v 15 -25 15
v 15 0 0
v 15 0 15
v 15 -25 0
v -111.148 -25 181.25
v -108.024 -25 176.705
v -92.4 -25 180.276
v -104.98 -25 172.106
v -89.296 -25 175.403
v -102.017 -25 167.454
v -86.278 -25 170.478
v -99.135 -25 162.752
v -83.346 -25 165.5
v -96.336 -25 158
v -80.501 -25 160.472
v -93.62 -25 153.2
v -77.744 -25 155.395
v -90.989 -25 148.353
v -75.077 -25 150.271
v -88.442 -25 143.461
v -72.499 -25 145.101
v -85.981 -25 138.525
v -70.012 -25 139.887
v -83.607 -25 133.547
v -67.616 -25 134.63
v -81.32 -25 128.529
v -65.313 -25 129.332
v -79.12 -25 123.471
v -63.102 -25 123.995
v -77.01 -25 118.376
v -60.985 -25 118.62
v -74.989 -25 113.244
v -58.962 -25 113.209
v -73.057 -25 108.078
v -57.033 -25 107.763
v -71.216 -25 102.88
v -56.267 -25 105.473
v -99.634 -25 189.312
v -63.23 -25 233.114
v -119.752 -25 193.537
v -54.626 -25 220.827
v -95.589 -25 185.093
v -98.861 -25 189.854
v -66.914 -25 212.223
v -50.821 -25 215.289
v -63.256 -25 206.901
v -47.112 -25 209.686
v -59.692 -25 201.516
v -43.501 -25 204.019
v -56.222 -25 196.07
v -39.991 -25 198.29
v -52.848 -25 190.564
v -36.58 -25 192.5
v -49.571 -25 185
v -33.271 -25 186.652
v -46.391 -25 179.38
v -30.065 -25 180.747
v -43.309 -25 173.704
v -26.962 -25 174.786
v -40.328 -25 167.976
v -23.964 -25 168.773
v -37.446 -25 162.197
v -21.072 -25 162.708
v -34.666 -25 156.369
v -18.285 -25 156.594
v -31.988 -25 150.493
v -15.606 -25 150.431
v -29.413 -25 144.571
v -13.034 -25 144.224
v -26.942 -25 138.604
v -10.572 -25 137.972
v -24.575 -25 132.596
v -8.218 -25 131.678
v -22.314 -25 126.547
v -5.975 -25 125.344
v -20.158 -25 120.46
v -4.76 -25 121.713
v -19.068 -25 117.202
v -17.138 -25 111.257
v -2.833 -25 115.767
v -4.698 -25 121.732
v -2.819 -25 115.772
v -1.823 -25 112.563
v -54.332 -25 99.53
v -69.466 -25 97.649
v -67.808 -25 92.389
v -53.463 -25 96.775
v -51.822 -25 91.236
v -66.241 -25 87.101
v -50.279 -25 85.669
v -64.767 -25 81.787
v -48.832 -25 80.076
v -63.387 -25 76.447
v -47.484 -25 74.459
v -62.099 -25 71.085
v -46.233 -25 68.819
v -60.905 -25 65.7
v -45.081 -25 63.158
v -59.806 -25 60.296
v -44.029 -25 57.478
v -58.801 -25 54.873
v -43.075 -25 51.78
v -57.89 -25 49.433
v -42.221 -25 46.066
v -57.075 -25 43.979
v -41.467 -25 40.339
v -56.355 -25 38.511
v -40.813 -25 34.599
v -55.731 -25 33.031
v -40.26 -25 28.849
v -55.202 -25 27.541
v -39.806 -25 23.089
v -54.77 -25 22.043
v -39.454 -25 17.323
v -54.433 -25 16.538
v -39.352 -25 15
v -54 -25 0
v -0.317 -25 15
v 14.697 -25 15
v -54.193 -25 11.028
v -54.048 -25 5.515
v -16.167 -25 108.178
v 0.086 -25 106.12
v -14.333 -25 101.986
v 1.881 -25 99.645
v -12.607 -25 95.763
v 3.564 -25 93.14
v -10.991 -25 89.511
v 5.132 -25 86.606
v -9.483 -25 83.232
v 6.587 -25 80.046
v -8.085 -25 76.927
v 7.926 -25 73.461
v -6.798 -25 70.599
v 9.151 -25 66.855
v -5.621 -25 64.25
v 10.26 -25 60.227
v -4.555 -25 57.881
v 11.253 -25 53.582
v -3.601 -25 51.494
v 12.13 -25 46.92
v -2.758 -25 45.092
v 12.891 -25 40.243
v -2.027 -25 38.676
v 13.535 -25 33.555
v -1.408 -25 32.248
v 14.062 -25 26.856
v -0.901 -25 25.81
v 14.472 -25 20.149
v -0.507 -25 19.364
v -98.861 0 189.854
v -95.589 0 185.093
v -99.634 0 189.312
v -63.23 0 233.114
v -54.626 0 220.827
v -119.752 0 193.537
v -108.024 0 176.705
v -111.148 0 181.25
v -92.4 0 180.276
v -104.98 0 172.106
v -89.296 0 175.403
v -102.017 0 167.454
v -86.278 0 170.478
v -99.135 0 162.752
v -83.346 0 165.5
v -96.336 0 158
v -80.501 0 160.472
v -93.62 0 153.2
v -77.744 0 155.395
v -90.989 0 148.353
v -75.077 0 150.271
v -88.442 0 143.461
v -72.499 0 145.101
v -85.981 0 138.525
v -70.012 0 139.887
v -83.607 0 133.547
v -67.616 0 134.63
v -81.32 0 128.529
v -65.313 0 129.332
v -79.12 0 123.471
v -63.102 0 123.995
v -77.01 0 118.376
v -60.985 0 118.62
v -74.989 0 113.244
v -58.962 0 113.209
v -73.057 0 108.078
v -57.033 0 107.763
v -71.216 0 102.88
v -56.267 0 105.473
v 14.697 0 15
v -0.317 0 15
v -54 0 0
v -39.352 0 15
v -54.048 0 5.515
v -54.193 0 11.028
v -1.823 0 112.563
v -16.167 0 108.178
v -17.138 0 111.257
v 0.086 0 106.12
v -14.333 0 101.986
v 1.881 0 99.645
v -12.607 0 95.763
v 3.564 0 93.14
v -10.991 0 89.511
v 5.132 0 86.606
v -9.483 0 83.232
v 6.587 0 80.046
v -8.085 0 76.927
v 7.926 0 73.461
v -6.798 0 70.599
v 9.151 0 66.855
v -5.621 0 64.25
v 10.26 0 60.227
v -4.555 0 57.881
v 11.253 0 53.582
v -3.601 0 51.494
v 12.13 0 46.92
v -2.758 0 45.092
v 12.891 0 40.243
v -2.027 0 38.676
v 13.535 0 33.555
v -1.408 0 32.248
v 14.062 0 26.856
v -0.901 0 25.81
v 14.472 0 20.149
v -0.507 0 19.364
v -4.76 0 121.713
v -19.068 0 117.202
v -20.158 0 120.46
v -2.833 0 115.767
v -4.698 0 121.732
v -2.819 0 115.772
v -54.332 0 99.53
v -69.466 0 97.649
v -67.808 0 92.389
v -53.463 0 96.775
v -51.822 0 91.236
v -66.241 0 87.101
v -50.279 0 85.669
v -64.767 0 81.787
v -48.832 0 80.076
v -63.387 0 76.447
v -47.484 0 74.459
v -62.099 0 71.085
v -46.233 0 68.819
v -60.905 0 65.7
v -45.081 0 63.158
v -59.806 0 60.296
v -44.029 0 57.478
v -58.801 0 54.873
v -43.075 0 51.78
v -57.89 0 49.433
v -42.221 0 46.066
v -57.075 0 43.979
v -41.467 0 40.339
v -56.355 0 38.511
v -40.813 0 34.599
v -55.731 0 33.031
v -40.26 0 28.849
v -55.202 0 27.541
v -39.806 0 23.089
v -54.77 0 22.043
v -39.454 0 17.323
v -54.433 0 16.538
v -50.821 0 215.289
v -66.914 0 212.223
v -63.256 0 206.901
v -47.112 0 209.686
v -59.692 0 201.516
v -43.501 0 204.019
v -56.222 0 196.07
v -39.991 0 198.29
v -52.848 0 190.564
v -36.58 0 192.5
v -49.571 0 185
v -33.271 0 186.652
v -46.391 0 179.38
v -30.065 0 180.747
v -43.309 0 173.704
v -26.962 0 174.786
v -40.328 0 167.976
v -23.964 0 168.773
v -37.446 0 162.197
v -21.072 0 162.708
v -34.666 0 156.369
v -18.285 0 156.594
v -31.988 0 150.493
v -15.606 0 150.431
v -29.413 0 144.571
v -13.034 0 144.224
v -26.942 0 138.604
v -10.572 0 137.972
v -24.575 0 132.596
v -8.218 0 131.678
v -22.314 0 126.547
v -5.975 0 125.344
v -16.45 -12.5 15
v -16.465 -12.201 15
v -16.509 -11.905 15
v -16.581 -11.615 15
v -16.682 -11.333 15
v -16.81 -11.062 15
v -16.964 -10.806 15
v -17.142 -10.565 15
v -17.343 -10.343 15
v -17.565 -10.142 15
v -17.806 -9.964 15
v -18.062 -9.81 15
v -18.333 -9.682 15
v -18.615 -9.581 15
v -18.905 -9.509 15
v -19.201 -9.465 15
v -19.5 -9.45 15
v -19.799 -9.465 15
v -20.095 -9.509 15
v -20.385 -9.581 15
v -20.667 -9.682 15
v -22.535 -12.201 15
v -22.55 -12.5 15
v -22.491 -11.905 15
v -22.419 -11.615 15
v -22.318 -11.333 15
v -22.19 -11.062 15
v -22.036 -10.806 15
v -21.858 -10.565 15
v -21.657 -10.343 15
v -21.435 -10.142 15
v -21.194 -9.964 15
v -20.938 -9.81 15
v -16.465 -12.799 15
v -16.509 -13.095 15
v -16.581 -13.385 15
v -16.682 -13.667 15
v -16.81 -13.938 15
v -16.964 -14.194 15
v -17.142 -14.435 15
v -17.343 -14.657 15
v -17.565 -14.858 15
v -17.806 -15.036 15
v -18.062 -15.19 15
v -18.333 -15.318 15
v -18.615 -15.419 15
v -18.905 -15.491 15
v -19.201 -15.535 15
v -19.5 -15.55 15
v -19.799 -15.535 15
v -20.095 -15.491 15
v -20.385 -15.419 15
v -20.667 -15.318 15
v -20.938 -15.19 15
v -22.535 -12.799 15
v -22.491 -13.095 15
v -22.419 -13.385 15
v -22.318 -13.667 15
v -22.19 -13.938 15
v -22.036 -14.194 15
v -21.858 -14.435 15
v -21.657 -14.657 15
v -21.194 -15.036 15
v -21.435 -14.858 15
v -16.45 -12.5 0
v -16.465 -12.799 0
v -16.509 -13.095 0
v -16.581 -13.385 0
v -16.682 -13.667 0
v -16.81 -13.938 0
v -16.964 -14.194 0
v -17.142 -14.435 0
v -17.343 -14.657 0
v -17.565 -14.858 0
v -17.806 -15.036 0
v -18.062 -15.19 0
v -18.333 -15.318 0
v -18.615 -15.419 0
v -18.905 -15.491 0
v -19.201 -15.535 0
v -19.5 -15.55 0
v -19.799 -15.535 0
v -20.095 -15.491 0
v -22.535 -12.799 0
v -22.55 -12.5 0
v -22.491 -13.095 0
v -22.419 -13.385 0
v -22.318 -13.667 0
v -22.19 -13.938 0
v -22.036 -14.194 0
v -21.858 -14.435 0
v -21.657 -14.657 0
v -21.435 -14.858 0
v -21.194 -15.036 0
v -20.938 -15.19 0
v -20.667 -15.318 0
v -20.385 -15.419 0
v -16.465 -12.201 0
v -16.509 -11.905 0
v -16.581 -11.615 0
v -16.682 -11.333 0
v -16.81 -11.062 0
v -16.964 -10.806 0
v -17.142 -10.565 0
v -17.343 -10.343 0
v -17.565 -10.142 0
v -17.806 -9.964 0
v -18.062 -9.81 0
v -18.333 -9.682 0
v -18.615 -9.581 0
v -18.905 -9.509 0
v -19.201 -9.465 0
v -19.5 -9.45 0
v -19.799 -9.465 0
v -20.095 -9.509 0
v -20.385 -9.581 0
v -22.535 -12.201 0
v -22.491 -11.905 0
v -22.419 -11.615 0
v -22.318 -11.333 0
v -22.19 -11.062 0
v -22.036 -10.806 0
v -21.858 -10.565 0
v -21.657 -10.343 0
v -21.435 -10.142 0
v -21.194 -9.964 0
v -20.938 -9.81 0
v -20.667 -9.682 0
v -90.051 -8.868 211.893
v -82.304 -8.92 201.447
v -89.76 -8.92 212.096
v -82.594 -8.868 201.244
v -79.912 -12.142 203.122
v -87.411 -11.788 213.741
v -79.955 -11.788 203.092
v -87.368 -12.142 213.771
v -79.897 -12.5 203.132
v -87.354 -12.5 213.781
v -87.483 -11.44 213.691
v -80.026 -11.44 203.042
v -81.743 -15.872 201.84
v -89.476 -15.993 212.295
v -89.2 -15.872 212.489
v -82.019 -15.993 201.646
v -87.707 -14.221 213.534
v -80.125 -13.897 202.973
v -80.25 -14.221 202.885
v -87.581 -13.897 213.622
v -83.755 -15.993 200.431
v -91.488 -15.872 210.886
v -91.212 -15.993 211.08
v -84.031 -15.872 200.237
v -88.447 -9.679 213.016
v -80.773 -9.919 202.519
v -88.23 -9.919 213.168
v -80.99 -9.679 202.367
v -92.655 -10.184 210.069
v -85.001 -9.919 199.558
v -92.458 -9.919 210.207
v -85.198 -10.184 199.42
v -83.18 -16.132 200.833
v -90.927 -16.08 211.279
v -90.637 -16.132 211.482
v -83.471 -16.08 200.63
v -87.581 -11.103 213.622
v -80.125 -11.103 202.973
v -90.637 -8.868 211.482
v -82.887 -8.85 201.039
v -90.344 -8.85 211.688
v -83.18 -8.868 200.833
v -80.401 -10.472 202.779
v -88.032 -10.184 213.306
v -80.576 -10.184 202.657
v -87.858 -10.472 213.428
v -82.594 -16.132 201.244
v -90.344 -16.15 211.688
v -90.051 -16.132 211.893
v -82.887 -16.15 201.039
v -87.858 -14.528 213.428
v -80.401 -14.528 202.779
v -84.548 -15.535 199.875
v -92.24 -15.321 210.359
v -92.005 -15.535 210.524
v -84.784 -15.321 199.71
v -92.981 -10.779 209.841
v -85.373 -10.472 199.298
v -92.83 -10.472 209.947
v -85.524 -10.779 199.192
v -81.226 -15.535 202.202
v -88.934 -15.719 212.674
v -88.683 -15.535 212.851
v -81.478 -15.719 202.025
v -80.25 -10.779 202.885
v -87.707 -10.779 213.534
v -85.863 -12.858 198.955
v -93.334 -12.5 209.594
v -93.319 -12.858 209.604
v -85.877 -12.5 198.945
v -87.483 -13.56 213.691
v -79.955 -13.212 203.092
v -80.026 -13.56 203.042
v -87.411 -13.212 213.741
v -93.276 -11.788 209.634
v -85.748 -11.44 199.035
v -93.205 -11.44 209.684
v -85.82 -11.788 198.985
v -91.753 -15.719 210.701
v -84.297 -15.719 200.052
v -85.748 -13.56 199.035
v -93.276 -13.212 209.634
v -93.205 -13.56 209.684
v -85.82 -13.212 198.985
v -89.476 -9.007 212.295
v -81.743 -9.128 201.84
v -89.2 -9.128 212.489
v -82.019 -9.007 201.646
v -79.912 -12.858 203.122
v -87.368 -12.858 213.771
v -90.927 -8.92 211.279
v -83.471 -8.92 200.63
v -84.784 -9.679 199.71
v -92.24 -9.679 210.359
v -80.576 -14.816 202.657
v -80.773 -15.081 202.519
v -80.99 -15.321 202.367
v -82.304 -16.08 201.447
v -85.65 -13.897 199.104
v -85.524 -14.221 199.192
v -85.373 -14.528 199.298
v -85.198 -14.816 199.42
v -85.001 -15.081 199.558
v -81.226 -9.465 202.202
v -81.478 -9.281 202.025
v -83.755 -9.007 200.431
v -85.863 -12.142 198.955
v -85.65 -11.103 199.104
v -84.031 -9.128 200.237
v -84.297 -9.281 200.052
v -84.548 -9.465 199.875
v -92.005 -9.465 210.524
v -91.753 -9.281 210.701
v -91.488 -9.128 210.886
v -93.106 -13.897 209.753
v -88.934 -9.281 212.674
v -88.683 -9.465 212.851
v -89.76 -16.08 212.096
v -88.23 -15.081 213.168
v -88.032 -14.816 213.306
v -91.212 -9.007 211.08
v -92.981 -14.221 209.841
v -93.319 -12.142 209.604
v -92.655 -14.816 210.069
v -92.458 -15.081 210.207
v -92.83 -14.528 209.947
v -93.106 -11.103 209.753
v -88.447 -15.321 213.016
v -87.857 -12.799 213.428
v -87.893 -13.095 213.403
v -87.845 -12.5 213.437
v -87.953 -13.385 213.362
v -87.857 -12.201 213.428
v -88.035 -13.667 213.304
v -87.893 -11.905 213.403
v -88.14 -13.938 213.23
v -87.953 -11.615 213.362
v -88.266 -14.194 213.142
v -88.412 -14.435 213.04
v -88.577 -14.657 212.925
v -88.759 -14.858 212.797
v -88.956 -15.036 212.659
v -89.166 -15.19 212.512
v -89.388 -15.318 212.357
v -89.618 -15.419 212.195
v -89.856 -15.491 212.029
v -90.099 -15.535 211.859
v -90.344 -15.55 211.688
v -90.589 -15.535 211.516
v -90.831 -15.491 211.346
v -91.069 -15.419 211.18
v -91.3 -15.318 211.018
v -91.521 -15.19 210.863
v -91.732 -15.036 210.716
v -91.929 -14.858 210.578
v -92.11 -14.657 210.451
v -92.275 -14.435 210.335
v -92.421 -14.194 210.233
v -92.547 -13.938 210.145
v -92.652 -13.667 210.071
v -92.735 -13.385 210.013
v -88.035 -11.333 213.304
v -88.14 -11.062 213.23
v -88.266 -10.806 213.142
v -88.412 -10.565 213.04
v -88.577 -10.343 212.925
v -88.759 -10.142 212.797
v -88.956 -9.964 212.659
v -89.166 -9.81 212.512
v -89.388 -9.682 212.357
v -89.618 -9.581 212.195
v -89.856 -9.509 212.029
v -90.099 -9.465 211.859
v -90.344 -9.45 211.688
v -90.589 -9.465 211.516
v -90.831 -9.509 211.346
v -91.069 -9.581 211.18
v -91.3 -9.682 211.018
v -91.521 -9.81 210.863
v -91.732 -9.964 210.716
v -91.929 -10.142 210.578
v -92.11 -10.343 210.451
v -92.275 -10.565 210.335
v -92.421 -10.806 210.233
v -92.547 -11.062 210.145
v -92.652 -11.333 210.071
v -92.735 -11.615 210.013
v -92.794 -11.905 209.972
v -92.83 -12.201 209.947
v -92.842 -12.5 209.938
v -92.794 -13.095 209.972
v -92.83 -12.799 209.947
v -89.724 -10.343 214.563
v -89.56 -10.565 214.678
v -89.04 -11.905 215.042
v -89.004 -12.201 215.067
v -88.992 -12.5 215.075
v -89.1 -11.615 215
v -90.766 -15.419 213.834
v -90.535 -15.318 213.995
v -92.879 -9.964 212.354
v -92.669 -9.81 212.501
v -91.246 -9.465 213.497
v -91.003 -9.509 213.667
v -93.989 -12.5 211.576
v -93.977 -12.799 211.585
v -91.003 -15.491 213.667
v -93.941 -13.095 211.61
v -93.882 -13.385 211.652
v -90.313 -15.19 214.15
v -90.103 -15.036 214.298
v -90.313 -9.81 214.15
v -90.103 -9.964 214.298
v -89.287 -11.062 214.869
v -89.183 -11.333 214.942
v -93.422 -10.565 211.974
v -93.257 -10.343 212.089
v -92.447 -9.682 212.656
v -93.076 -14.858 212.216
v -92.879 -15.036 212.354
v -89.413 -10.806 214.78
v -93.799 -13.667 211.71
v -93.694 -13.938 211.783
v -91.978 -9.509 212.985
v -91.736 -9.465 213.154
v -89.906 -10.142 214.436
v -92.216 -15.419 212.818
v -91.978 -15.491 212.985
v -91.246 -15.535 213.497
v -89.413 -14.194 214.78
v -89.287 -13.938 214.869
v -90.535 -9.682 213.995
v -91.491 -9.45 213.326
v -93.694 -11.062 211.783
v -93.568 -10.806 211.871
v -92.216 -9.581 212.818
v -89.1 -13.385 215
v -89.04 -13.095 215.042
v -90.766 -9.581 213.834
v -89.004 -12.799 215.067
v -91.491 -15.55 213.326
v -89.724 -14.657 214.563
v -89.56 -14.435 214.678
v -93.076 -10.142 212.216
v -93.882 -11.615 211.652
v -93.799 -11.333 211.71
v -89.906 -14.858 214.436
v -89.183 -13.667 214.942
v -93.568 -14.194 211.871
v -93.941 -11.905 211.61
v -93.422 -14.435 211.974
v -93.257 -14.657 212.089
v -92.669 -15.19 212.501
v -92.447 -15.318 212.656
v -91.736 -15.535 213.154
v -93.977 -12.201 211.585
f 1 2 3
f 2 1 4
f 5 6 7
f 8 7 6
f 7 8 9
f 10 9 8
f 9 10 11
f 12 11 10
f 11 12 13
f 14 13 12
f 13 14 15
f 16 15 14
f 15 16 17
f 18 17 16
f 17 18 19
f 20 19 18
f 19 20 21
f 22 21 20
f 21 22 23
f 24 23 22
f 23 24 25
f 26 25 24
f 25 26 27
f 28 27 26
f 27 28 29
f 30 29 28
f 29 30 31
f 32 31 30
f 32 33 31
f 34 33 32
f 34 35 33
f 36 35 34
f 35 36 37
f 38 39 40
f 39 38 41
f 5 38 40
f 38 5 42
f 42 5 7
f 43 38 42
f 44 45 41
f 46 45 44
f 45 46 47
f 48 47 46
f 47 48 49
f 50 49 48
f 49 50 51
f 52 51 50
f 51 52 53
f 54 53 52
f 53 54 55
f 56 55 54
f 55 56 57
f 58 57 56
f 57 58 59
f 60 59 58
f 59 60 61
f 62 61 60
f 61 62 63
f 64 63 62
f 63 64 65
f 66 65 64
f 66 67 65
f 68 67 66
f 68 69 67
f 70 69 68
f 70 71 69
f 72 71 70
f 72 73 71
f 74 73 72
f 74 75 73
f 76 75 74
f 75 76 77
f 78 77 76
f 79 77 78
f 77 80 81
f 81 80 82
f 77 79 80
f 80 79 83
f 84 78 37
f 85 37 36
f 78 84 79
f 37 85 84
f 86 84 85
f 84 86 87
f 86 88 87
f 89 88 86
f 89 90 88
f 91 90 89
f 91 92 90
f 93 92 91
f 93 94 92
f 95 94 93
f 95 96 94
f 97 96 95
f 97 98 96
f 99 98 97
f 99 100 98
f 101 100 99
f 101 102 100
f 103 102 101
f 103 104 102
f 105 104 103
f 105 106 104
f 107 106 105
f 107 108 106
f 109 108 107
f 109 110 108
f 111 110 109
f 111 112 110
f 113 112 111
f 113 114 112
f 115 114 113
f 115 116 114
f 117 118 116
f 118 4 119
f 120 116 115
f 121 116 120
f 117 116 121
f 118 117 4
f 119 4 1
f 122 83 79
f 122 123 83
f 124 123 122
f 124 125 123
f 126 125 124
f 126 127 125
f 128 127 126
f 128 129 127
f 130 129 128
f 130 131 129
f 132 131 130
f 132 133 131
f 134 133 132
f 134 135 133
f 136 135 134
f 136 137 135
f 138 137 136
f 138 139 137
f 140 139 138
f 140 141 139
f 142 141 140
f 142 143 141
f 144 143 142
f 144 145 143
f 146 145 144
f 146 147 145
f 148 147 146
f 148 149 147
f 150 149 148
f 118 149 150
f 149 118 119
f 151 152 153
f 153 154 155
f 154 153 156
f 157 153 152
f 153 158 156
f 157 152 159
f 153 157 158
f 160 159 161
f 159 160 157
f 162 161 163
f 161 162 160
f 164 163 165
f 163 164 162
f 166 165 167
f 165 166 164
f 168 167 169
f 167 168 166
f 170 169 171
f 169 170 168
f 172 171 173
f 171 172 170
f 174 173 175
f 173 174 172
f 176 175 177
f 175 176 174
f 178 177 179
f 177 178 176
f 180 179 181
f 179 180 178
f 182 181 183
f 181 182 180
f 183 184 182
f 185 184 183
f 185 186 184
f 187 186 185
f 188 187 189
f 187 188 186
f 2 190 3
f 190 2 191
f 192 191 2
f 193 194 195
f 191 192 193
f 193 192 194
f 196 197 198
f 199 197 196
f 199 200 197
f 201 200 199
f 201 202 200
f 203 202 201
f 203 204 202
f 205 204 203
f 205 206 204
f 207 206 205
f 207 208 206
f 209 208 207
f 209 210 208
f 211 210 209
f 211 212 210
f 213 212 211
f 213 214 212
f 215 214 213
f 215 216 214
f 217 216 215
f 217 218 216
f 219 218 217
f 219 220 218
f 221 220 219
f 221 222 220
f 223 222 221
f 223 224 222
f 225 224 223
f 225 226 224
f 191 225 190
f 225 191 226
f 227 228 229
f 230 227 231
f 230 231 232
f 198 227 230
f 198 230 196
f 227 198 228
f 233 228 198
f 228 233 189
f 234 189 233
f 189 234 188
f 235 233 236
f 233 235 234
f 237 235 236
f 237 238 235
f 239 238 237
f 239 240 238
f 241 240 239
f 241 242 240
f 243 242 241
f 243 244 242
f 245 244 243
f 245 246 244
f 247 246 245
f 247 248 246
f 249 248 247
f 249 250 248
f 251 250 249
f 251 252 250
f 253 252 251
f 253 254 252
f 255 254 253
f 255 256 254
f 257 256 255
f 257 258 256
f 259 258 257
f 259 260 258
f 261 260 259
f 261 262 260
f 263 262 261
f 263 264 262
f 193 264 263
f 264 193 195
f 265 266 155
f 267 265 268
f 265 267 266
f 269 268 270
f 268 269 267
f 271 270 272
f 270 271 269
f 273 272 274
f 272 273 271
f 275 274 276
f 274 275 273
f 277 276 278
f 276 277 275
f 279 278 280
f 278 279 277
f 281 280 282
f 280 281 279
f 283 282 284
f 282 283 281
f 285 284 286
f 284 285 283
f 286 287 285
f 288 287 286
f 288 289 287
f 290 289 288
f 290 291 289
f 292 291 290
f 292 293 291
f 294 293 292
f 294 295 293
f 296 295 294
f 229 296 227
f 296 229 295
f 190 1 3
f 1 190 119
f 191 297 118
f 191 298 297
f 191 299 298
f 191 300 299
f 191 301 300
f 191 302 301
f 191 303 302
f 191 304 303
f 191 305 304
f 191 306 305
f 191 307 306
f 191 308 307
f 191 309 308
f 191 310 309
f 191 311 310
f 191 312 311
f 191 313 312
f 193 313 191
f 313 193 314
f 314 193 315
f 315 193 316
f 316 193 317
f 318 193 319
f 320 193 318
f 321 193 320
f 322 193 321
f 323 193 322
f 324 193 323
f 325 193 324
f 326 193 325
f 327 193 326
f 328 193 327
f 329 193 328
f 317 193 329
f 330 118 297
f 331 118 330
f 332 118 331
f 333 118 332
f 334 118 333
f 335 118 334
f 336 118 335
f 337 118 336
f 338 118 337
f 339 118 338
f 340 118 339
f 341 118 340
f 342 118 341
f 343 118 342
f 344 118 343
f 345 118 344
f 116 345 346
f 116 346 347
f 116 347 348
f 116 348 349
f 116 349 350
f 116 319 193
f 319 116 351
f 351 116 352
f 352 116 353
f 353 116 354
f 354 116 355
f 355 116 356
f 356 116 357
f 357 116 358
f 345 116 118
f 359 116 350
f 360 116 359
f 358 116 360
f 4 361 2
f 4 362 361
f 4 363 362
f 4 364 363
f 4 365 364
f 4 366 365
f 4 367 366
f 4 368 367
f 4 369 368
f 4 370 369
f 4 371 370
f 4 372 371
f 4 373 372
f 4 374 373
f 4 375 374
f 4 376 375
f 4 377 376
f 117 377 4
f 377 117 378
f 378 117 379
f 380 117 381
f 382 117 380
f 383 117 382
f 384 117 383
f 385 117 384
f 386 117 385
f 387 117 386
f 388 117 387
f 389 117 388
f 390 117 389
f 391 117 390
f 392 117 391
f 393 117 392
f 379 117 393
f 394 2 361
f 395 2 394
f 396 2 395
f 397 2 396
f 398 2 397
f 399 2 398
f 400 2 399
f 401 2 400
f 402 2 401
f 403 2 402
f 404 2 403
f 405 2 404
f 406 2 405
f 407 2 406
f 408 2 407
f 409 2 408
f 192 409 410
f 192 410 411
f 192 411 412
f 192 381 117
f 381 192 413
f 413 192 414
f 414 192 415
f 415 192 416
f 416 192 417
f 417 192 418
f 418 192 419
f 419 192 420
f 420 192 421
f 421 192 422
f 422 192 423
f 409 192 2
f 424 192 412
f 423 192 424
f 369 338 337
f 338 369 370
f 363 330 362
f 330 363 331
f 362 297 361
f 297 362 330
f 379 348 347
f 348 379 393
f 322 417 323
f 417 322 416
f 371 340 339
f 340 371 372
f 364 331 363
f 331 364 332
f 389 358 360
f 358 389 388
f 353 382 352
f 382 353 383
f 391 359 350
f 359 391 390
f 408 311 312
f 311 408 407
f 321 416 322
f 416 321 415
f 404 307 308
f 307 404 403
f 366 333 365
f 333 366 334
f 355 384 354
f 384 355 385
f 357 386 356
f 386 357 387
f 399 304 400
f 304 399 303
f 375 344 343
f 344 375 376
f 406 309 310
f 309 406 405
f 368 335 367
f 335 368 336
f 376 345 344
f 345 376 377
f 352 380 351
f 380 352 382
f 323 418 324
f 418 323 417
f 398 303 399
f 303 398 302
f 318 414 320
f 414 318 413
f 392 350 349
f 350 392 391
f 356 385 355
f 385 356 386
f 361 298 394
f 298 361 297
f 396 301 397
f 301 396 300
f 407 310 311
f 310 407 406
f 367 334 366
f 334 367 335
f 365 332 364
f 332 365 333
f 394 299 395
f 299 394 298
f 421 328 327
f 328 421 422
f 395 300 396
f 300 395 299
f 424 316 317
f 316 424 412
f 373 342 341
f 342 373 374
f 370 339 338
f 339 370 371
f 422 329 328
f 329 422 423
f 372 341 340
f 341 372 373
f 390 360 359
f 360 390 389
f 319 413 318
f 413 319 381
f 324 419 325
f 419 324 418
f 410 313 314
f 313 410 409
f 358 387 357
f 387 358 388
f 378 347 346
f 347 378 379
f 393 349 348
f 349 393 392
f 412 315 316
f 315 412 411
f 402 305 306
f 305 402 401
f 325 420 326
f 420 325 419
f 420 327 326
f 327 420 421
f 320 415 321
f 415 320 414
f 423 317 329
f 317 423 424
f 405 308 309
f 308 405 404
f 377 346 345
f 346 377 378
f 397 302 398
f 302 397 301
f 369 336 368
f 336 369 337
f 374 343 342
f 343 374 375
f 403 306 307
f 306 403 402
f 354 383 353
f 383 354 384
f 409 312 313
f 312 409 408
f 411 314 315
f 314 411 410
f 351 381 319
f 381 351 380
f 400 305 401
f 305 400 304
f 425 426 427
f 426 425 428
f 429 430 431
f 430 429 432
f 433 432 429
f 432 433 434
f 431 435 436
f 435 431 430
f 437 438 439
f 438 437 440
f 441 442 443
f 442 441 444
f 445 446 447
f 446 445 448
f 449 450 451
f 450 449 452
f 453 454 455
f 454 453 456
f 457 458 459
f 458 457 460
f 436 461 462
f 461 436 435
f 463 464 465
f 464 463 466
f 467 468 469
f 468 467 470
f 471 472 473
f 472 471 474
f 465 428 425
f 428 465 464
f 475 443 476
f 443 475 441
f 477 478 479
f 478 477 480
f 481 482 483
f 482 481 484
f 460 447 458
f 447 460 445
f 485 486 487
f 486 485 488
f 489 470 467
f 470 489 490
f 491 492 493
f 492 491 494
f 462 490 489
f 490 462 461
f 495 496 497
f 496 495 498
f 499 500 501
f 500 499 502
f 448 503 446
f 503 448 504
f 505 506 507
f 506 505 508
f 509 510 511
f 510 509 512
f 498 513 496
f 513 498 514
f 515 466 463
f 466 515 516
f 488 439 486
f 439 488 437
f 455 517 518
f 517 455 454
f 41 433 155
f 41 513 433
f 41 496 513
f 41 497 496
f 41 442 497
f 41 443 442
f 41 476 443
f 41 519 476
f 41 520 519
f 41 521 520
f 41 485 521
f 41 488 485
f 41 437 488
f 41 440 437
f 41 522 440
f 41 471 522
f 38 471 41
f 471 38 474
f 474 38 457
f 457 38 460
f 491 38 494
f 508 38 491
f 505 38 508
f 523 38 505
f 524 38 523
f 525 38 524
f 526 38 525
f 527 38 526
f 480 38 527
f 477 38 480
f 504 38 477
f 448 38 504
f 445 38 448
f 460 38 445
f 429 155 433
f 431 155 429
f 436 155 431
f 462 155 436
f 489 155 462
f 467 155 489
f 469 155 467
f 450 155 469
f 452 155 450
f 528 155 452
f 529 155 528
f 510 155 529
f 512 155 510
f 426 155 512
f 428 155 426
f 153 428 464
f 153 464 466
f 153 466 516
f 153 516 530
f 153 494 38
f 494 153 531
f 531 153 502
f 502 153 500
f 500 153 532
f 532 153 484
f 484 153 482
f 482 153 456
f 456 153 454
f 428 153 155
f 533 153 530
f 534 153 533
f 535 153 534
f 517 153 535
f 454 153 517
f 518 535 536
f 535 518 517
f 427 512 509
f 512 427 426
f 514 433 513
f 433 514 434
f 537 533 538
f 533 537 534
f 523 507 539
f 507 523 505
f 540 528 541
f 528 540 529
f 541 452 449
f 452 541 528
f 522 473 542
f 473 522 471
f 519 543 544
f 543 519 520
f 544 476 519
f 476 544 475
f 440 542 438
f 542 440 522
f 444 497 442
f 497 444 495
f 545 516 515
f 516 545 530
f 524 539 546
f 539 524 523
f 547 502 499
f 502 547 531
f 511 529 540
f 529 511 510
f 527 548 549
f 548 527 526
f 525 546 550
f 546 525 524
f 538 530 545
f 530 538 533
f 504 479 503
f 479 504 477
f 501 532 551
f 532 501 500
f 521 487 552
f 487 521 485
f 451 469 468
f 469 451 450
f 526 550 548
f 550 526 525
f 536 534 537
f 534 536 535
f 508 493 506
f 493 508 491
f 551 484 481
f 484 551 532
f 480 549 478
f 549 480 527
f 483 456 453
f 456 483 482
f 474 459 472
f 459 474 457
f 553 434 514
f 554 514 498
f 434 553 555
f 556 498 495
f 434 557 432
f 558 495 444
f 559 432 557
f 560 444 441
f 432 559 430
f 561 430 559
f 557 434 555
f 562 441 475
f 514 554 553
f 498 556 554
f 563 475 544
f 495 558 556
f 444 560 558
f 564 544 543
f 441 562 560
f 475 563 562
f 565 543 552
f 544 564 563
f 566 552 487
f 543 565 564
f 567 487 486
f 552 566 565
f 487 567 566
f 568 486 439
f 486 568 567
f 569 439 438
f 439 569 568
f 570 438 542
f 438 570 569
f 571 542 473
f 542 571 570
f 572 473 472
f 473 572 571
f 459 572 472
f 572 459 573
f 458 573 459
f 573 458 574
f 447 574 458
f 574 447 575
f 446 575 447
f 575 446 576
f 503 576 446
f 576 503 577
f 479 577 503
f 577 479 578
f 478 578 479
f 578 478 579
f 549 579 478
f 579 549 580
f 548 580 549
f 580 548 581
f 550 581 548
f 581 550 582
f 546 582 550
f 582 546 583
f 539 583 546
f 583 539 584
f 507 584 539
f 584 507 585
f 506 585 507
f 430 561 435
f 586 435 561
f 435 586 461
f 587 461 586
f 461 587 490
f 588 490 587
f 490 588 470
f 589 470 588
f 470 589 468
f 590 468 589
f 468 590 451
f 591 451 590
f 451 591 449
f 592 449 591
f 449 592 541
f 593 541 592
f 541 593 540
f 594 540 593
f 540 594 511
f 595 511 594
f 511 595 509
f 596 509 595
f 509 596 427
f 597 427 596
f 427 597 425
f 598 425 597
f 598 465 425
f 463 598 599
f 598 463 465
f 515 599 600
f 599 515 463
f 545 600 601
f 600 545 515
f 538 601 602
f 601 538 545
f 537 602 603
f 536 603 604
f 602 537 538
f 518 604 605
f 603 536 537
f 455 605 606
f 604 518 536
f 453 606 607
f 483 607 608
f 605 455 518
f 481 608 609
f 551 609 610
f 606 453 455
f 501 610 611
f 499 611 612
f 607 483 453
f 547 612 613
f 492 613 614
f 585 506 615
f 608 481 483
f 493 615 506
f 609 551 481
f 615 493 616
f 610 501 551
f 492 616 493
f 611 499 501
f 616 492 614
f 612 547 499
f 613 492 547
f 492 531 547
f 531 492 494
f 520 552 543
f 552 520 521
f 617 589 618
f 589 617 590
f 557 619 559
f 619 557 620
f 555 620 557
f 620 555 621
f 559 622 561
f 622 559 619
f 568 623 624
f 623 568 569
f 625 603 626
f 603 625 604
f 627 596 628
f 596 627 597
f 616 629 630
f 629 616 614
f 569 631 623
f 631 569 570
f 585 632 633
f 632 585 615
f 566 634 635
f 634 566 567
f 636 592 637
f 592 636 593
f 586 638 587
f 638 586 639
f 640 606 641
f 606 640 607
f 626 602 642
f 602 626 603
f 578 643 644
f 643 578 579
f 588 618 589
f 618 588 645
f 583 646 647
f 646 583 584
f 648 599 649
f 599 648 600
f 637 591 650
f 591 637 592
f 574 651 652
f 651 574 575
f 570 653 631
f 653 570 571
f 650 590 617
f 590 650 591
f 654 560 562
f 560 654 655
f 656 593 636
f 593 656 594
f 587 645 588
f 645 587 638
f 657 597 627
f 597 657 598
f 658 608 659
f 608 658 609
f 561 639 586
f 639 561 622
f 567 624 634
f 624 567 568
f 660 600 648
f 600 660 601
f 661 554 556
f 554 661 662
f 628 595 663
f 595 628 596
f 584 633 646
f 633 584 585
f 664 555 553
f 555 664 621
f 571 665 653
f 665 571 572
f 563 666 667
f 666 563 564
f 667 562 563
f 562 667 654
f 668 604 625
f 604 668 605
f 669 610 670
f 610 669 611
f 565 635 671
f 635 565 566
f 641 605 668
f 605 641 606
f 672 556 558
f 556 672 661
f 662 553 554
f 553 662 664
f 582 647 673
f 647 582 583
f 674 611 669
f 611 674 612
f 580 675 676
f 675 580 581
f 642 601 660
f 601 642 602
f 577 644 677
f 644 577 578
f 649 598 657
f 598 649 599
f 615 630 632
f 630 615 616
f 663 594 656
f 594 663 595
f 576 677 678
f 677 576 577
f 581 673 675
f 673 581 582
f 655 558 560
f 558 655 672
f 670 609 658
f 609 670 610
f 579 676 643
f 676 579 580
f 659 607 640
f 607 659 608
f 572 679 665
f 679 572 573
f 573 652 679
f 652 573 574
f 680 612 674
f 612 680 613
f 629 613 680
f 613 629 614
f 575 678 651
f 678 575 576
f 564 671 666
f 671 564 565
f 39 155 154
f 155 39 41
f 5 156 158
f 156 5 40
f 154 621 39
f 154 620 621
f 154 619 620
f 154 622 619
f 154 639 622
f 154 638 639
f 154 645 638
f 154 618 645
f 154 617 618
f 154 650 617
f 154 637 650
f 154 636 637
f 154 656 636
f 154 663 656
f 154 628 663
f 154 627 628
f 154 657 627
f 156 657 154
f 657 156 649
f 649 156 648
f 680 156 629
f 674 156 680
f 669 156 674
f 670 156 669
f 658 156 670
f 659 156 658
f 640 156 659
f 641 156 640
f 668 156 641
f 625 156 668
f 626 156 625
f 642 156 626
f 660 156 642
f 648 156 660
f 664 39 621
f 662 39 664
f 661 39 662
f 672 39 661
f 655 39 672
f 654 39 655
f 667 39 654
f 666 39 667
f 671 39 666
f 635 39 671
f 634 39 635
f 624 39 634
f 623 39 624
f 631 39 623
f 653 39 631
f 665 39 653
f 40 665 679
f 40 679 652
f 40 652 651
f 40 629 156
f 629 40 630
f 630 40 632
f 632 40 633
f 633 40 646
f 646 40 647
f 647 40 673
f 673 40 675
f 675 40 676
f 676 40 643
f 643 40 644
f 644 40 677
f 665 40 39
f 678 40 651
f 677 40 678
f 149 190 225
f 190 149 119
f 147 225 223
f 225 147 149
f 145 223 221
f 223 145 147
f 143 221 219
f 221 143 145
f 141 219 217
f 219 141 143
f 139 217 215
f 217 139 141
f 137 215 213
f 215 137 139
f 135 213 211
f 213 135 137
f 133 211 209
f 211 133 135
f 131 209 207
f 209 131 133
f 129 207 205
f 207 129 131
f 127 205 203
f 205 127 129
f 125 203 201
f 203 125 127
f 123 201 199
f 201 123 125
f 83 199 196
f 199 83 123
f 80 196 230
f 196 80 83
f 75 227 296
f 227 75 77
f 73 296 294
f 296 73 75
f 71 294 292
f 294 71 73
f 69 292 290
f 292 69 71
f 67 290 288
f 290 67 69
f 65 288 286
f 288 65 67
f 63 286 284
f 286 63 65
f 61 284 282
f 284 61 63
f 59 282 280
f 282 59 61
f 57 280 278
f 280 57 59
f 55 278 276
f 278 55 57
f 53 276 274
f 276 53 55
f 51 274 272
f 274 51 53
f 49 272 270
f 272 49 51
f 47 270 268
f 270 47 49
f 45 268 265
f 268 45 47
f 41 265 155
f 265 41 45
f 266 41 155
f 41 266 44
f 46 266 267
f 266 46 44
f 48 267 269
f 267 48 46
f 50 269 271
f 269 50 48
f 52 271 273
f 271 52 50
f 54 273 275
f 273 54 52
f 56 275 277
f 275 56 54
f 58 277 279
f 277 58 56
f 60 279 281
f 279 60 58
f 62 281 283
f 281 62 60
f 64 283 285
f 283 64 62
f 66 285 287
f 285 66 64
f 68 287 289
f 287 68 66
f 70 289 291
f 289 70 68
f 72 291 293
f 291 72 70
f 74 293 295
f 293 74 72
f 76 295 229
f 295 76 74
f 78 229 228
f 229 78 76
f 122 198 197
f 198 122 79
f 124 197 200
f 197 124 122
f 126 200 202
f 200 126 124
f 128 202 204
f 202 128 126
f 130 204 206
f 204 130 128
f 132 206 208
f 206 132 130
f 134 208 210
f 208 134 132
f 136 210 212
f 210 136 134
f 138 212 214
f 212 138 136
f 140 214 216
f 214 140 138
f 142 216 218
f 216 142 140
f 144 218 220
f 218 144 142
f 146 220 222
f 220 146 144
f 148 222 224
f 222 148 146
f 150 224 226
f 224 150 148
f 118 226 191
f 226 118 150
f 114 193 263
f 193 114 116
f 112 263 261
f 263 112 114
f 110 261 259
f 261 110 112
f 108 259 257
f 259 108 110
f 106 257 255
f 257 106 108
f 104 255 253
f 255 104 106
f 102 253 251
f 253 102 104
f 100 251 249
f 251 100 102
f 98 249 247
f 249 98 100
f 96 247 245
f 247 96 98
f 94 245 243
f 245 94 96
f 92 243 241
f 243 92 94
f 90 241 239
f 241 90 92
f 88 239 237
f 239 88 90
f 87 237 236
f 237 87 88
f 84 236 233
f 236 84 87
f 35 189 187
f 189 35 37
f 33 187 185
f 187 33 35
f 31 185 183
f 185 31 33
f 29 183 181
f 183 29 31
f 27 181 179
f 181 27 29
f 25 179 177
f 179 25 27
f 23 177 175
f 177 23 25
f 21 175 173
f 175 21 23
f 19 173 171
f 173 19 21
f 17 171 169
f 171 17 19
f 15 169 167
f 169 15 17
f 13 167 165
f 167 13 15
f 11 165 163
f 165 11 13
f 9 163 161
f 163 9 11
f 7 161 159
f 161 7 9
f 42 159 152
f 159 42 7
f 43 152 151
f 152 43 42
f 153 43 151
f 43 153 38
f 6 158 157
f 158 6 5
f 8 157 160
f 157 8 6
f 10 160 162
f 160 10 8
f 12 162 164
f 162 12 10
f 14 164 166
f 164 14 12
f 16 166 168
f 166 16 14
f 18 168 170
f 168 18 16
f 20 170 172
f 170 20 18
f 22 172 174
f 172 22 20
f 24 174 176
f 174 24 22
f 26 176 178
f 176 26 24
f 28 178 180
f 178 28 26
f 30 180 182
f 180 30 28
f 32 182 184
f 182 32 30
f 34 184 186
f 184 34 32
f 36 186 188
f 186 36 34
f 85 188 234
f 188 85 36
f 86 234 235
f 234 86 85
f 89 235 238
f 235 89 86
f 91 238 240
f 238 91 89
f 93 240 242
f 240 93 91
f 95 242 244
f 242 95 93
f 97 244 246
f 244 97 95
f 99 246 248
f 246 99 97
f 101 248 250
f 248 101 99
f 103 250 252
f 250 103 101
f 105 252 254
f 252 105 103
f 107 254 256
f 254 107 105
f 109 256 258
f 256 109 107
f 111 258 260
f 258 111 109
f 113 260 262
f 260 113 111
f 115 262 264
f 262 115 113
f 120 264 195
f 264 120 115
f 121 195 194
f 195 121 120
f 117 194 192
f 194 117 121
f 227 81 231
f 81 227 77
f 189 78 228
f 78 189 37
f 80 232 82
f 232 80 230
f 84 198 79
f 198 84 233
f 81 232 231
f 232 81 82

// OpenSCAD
// file: base.scad
// pc-licht-stativ-halter

// 25, 18.25
// check: 18.25 + 6.6 == 24.85

$fn=64;

w=76;
h=3;

h_ribs=2.7;

d_total = 60;
d_ribs = 44.5;

tolerance_ribs = 0.1;
r_ribs = 6.6/2 - tolerance_ribs;

module base(){
    cube([76, 60, h]);
    
    for(x=[12.5:24.85:w]){  // 12.5 zum äußeren Rand gemessen
        hull(){
            translate([x+r_ribs, (d_total-d_ribs)/2 + r_ribs, -h_ribs])
            cylinder(r=r_ribs, h=h_ribs);
            
            translate([x+r_ribs, (d_total-d_ribs)/2 + d_ribs - r_ribs, -h_ribs])
            cylinder(r=r_ribs, h=h_ribs);
        }
    }
}

//base();
// main file
// licht halterung

// idee: gut basis, je 3 arme 25cm lang mit 10° neigung

include <base.scad>;

angles = [0, 35];
width = 15;
height=25;
dist = 39;
height_end=15;

radius = 370;
radius2 = radius-dist-width;

fn = 5;

module sector(radius, angles, fn = 24) {
    r = radius / cos(180 / fn);
    step = -360.0 / fn;

    points = concat([[0, 0]],
        [for(a = [angles[0] : step : angles[1] - 360]) 
            [r * cos(a), r * sin(a)]
        ],
        [[r * cos(angles[1]), r * sin(angles[1])]]
    );

    difference() {
        circle(radius, $fn = fn);
        polygon(points);
    }
}

module arc(radius, angles, width = 1, fn = 360) {
    difference() {
        sector(radius + width, angles, fn);
        sector(radius, angles, fn);
    }
} 

if(false){  // print plate dimensions
    %translate([-250, 0, 0])
    cube([250, 250, 1]);
}

module einschmelzhuelse(){
    rotate([90,0,0]){
        cylinder(r=7.3/2, h=13); // hülse
        cylinder(r=6.1/2, h=40); // schraube
    }
}

module arm(base_end=true){
    // arm
    difference(){
        union(){
            translate([-radius, 0, 0])
            linear_extrude(height) arc(radius, angles, width);

            translate([-radius2-width-dist, 0, 0])
            linear_extrude(height) arc(radius2, angles, width);
            
            if(base_end){
                difference(){
                    union(){
                        hull(){
                            // base
                            translate([-dist-width-6,-3, 75-width])
                            rotate([-90,0,0])
                            cube([76, 60, h]);
                            
                            // start-piece bottom
                            translate([-dist-width, 0, 0])
                            cube([2*width+dist, height_end, height]);
                        }

                        // ribs for base
                        translate([-dist-width-6,-3, 75-width])
                        rotate([-90,0,0])
                        for(x=[12.5:24.85:w]){  // 12.5 zum äußeren Rand gemessen
                            hull(){
                                translate([x+r_ribs, (d_total-d_ribs)/2 + r_ribs, -h_ribs])
                                cylinder(r=r_ribs, h=h_ribs);
                                
                                translate([x+r_ribs, (d_total-d_ribs)/2 + d_ribs - r_ribs, -h_ribs])
                                cylinder(r=r_ribs, h=h_ribs);
                            }
                        }
                    }
                    
                    // hole for 1/4" einschmelzhülse bottom
                    translate([-dist/2,height_end+0.001, height/2])
                    einschmelzhuelse();
                }
            }else{
                difference(){
                    // start-piece bottom
                    translate([-dist-width, 0, 0])
                    cube([2*width+dist, height_end, height]);
                    
                    // hole for 1/4" einschmelzhülse bottom
                    translate([-dist/2,height_end+0.001, height/2])
                    rotate([90,0,0]){
                        //cylinder(r=7.3/2, h=13); // hülse
                        cylinder(r=6.1/2, h=40); // schraube
                    }
                }
            }

            // middle-piece
            translate([-radius, 0, 0])
            rotate([0,0, angles[1]/2])
            translate([radius-width-dist, 0, 0])
            cube([2*width+dist, height/4, height]);

            // end-piece top
            translate([-radius, 0, 0])
            rotate([0,0, angles[1]])
            translate([radius-width-dist, 0, 0]){
                difference(){
                    cube([2*width+dist, height_end, height]);
                    
                    // hole for 1/4" einschmelzhülse bottom
                    #translate([width+dist/2, 0, height/2])
                    rotate([180,0,0])
                    einschmelzhuelse();
                }
            }
        }
        
    }

    
}

rotate([90,0,0])
color("white")
arm(base_end=false);
